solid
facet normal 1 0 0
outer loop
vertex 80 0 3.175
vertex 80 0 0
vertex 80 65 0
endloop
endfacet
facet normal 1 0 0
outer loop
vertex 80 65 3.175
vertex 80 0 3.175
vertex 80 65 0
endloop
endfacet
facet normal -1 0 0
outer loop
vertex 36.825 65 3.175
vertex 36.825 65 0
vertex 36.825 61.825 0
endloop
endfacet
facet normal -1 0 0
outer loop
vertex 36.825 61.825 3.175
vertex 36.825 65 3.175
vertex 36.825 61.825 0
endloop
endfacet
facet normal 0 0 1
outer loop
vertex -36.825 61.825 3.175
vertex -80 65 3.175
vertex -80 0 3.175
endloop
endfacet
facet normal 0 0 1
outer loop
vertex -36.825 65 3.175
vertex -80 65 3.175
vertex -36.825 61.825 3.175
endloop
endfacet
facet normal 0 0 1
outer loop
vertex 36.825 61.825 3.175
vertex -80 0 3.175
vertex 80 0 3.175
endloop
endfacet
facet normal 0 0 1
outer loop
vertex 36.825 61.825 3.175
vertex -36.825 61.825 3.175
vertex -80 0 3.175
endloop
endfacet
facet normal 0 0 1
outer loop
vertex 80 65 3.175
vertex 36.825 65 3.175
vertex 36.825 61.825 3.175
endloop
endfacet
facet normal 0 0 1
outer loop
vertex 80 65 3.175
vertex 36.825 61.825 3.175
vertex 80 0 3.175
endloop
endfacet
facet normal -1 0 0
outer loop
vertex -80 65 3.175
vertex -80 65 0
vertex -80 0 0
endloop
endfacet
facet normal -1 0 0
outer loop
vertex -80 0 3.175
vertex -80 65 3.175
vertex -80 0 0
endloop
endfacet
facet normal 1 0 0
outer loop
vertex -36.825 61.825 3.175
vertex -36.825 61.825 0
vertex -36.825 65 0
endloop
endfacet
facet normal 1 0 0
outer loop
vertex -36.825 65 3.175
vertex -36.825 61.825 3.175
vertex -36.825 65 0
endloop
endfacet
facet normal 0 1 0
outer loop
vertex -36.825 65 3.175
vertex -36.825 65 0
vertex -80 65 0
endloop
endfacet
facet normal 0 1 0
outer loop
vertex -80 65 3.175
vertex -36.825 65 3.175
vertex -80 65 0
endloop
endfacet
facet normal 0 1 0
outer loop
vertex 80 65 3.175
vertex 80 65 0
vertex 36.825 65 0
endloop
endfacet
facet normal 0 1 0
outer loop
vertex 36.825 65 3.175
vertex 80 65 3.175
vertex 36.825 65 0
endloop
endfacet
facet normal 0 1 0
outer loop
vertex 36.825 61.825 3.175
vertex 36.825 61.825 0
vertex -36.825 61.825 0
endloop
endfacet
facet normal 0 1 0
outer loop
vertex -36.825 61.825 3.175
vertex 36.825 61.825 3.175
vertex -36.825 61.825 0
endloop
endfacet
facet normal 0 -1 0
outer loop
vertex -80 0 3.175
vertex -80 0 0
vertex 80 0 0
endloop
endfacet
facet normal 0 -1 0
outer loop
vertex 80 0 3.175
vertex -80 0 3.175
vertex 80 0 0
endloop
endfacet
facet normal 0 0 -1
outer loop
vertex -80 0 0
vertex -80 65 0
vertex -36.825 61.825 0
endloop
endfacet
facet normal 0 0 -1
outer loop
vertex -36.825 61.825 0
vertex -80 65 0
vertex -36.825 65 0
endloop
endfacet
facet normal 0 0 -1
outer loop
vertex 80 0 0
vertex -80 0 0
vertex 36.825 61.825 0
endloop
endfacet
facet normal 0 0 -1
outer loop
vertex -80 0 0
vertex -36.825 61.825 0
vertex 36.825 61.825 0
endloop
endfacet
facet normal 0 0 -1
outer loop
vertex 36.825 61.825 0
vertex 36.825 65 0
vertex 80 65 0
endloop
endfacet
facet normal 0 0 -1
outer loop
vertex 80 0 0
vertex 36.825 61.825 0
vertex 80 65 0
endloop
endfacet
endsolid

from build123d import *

# Parameters (mm, degrees)
BOSS_EXTRUDE1_DEPTH = 3.175


with BuildPart() as part:
    # Sketch1 → Boss-Extrude1 (new body)
    with BuildSketch(Plane.XY):
        Polygon((0, 0), (80, 0), (80, 65), (36.825, 65), (36.825, 61.825), (-36.825, 61.825), (-36.825, 65), (-80, 65), (-80, 0), align=None)
    extrude(amount=BOSS_EXTRUDE1_DEPTH)


solid = part.part
